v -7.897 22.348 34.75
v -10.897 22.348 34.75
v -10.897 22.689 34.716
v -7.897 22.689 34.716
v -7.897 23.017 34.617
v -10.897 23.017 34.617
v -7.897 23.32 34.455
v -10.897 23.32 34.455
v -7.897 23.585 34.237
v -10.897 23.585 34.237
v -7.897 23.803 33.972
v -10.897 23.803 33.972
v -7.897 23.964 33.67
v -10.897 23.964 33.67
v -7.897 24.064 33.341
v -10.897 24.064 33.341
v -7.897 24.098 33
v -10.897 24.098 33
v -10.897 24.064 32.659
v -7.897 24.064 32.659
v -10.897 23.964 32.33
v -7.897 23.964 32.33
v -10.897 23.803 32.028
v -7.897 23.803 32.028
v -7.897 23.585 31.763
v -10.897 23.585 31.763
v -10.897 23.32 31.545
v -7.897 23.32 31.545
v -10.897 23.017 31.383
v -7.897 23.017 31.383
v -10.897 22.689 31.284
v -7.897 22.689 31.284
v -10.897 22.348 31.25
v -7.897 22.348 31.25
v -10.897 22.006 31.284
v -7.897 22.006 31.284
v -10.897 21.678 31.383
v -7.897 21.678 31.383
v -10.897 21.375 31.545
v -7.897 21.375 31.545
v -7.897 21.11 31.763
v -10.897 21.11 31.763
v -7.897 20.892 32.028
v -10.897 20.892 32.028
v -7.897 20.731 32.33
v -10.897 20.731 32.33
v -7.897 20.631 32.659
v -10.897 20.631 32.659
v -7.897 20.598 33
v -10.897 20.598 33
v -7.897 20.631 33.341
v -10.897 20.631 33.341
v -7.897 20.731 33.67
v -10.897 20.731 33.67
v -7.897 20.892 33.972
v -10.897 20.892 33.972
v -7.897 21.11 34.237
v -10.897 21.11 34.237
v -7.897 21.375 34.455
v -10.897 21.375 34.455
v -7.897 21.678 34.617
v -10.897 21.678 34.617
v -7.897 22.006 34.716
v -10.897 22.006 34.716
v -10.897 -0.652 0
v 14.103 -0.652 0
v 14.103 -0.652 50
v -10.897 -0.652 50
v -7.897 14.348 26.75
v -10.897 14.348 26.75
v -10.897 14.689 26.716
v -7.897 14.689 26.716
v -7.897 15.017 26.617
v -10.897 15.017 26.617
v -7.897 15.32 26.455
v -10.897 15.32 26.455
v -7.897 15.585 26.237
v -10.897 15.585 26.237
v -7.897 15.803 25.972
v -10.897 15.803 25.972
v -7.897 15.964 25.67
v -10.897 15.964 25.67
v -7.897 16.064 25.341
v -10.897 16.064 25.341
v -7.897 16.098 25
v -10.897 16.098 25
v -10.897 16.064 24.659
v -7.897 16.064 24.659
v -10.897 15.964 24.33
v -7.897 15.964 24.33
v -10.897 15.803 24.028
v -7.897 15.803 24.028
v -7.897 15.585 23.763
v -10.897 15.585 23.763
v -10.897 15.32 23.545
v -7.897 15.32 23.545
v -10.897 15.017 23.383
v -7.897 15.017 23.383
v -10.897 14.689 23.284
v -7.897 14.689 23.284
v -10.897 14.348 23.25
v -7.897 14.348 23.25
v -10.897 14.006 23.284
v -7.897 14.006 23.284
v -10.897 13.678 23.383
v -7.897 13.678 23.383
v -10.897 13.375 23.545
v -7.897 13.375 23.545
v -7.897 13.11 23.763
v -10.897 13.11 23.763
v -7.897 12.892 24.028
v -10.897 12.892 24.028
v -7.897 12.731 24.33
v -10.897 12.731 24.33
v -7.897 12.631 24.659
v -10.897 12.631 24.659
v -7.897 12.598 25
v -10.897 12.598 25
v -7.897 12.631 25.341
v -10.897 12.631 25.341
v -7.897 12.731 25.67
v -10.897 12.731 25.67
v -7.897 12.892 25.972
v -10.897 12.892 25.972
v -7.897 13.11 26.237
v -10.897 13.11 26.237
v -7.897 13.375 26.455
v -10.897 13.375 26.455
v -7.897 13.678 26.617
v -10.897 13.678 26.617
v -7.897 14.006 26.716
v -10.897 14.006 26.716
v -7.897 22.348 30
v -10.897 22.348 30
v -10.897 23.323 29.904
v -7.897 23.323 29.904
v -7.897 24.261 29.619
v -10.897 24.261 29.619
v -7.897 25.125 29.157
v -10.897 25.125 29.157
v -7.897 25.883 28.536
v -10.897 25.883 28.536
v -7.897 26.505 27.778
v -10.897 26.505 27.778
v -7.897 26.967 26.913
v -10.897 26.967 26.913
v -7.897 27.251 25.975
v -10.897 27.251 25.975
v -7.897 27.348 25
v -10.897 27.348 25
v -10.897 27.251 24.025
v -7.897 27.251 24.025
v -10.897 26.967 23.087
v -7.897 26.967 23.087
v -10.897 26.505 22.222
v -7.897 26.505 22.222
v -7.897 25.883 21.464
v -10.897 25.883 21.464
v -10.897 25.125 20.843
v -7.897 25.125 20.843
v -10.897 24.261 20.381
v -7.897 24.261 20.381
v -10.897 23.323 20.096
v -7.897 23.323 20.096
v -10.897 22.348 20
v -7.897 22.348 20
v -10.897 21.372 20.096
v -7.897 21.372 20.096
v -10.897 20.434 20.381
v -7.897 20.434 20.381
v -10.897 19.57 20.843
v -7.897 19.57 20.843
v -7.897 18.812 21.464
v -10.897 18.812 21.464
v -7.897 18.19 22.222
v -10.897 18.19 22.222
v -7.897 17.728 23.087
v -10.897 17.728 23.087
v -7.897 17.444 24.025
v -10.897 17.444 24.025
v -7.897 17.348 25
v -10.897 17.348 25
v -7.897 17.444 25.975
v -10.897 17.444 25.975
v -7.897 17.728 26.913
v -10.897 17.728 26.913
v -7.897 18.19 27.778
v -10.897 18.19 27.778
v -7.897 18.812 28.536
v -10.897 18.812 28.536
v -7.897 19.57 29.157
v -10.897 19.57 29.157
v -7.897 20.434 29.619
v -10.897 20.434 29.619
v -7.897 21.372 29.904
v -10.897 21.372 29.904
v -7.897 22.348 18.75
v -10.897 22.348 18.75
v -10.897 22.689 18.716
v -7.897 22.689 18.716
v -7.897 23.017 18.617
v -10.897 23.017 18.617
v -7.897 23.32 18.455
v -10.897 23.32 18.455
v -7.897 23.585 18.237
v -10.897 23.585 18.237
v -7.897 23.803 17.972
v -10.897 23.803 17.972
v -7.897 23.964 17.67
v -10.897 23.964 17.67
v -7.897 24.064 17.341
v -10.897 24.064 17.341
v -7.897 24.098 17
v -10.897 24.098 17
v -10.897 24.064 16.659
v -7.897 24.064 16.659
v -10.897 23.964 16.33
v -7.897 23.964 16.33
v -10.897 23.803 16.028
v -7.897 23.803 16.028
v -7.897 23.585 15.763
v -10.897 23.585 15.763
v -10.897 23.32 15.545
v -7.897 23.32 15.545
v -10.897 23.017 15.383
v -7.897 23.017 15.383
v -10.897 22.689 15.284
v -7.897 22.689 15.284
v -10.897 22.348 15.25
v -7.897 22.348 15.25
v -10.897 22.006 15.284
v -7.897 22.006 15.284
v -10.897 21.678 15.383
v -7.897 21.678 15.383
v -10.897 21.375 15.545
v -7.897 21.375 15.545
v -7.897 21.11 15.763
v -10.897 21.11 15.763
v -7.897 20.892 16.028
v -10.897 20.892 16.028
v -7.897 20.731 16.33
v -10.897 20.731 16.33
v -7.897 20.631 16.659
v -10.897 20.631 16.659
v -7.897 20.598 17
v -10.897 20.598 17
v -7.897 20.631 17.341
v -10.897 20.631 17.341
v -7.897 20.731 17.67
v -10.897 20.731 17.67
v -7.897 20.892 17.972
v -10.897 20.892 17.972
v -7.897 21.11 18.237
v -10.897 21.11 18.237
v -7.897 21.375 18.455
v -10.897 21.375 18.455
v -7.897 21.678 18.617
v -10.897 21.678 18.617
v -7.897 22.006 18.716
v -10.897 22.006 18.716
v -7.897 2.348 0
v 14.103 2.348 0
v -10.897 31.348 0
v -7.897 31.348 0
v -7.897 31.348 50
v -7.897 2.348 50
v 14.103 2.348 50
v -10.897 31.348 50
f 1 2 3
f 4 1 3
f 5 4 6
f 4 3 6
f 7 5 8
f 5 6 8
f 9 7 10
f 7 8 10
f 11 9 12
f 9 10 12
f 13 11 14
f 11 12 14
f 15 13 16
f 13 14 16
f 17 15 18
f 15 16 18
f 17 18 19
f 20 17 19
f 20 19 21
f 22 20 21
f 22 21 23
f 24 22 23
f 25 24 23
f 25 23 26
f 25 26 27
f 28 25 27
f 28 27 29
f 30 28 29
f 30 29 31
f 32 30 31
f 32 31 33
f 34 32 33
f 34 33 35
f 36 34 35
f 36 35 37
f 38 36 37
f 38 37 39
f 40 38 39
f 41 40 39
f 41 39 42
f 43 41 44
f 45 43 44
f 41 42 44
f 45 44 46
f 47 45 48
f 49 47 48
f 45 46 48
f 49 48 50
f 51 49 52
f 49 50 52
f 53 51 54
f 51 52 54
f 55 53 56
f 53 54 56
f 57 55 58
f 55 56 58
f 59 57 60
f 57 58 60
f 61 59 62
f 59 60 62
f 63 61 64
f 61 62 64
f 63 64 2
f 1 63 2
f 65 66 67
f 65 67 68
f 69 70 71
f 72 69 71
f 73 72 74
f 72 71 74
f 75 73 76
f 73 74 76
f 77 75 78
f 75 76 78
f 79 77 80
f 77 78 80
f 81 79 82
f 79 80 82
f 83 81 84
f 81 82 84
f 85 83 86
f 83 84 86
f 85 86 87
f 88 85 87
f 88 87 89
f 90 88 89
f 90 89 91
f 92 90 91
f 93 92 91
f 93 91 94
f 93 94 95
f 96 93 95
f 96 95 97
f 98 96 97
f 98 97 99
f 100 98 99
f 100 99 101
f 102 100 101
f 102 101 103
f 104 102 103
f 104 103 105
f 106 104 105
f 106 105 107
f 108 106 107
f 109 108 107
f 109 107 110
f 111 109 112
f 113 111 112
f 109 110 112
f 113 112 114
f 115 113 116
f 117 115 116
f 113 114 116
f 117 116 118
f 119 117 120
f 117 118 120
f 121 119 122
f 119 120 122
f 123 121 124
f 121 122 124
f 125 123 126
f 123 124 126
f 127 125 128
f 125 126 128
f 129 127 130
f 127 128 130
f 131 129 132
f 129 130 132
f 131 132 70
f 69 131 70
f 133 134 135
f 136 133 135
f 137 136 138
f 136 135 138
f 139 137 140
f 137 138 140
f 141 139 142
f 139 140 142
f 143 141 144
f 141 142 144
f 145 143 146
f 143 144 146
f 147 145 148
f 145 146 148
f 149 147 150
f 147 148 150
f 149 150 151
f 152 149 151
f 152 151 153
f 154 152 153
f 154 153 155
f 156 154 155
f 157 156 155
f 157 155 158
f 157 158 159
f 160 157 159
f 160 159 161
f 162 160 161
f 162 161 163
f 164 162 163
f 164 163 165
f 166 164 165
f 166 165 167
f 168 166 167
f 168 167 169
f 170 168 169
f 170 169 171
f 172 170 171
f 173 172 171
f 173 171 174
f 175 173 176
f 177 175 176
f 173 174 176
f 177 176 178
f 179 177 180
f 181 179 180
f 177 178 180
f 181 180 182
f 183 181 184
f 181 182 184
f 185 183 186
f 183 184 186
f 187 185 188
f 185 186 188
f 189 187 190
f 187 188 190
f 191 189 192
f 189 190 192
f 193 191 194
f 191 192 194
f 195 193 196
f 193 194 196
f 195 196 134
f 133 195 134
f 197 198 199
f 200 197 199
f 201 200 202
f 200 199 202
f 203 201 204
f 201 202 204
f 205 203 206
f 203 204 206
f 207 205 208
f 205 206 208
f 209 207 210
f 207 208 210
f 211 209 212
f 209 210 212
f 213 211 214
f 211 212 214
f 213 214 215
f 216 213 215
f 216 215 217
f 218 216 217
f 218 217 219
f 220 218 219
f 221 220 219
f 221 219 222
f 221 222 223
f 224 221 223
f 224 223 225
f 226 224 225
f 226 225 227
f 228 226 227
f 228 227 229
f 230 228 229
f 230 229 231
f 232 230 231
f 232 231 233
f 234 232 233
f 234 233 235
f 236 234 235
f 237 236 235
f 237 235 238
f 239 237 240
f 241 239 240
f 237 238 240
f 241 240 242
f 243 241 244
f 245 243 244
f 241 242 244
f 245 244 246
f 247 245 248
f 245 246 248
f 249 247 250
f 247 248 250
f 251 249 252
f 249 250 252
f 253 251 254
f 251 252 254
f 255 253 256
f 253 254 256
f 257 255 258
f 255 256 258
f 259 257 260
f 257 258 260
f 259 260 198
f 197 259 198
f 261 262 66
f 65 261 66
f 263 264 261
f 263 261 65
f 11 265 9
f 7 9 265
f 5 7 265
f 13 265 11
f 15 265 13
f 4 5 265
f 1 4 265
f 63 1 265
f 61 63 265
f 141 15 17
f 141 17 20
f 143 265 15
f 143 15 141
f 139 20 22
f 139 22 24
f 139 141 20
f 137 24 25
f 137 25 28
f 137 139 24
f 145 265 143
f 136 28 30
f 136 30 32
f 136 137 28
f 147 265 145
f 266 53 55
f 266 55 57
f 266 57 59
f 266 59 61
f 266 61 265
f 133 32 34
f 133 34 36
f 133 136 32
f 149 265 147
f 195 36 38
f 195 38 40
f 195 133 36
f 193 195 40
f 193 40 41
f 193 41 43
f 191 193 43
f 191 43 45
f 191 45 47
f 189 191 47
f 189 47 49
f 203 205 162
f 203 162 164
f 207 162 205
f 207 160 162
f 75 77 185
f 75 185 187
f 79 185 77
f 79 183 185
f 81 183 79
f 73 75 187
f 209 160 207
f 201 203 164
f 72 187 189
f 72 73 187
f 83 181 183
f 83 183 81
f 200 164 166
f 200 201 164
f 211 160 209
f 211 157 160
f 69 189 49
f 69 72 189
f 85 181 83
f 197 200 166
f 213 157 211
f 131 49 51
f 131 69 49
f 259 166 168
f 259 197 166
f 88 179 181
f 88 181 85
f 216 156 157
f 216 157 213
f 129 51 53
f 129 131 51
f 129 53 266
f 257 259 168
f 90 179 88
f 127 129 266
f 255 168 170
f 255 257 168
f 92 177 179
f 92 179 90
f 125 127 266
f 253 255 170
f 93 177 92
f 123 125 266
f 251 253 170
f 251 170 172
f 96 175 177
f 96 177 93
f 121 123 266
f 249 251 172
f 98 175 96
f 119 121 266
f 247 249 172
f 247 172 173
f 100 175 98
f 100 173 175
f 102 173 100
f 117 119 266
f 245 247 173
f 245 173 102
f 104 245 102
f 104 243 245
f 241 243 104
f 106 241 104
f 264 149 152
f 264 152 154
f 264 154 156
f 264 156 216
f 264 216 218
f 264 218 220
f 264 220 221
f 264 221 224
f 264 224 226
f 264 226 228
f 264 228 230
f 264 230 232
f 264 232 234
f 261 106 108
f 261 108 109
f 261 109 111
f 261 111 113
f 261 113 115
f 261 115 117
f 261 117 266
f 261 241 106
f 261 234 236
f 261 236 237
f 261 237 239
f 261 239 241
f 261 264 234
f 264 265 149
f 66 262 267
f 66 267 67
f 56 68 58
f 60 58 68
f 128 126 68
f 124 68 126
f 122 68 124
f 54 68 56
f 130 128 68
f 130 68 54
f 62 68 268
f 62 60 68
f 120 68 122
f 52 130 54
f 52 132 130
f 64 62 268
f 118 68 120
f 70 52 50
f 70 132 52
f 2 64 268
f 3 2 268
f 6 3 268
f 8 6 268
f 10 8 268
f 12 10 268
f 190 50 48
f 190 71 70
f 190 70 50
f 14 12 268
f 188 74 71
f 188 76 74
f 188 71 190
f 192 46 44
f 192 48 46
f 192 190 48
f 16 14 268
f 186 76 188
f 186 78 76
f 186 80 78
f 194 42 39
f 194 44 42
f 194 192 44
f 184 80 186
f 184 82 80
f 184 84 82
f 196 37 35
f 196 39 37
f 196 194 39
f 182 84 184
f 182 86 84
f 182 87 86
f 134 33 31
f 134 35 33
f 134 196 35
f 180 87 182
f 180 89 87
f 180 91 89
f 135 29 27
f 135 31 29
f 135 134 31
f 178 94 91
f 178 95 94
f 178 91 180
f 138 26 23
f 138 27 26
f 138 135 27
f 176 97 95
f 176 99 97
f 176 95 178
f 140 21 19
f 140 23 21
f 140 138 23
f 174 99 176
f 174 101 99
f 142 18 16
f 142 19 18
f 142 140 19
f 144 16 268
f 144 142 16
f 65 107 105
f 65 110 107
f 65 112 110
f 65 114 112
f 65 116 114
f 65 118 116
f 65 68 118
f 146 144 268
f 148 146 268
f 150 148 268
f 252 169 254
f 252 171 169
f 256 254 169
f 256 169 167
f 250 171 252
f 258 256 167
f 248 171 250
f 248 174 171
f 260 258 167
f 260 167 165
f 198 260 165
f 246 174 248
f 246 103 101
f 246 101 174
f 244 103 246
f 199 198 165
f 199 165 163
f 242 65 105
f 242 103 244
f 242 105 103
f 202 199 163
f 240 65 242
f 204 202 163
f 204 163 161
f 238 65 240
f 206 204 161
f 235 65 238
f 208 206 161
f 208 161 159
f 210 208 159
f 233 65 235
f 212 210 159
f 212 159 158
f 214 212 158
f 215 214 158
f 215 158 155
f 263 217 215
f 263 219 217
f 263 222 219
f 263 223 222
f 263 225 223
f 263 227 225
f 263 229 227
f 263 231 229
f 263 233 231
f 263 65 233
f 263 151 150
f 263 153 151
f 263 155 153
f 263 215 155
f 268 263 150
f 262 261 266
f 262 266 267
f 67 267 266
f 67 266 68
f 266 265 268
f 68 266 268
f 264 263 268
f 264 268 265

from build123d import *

# Parameters (mm, degrees)
BOSS_EXTRUDE1_DEPTH            = 50
HOLE_FOR_M5_300_SC_NUTS_SP_1_D = 10
HOLE_FOR_M5_300_SC_NUTS_SP_2_D = 3.5


with BuildPart() as part:
    # Sketch1 → Boss-Extrude1 (new body)
    with BuildSketch(Plane.XY):
        Polygon((-7.897485035, 31.347562808), (-7.897485035, 2.347562808), (14.102514965, 2.347562808), (14.102514965, -0.652437192), (-10.897485035, -0.652437192), (-10.897485035, 31.347562808), align=None)
    extrude(amount=BOSS_EXTRUDE1_DEPTH)

    # Hole for M5 300® SC Nuts (SP)1 (through all)
    with Locations(Plane(origin=(-7.897485035, 0, 0), x_dir=(0, 0, -1), z_dir=(1, 0, 0))):
        with Locations((-25, 22.347562808)):
            Hole(HOLE_FOR_M5_300_SC_NUTS_SP_1_D / 2)

    # Hole for M5 300® SC Nuts (SP)2 (through all)
    with Locations(Plane(origin=(-7.897485035, 0, 0), x_dir=(0, 0, -1), z_dir=(1, 0, 0))):
        with Locations((-17, 22.347562808), (-33, 22.347562808), (-25, 14.347562808)):
            Hole(HOLE_FOR_M5_300_SC_NUTS_SP_2_D / 2)


solid = part.part
